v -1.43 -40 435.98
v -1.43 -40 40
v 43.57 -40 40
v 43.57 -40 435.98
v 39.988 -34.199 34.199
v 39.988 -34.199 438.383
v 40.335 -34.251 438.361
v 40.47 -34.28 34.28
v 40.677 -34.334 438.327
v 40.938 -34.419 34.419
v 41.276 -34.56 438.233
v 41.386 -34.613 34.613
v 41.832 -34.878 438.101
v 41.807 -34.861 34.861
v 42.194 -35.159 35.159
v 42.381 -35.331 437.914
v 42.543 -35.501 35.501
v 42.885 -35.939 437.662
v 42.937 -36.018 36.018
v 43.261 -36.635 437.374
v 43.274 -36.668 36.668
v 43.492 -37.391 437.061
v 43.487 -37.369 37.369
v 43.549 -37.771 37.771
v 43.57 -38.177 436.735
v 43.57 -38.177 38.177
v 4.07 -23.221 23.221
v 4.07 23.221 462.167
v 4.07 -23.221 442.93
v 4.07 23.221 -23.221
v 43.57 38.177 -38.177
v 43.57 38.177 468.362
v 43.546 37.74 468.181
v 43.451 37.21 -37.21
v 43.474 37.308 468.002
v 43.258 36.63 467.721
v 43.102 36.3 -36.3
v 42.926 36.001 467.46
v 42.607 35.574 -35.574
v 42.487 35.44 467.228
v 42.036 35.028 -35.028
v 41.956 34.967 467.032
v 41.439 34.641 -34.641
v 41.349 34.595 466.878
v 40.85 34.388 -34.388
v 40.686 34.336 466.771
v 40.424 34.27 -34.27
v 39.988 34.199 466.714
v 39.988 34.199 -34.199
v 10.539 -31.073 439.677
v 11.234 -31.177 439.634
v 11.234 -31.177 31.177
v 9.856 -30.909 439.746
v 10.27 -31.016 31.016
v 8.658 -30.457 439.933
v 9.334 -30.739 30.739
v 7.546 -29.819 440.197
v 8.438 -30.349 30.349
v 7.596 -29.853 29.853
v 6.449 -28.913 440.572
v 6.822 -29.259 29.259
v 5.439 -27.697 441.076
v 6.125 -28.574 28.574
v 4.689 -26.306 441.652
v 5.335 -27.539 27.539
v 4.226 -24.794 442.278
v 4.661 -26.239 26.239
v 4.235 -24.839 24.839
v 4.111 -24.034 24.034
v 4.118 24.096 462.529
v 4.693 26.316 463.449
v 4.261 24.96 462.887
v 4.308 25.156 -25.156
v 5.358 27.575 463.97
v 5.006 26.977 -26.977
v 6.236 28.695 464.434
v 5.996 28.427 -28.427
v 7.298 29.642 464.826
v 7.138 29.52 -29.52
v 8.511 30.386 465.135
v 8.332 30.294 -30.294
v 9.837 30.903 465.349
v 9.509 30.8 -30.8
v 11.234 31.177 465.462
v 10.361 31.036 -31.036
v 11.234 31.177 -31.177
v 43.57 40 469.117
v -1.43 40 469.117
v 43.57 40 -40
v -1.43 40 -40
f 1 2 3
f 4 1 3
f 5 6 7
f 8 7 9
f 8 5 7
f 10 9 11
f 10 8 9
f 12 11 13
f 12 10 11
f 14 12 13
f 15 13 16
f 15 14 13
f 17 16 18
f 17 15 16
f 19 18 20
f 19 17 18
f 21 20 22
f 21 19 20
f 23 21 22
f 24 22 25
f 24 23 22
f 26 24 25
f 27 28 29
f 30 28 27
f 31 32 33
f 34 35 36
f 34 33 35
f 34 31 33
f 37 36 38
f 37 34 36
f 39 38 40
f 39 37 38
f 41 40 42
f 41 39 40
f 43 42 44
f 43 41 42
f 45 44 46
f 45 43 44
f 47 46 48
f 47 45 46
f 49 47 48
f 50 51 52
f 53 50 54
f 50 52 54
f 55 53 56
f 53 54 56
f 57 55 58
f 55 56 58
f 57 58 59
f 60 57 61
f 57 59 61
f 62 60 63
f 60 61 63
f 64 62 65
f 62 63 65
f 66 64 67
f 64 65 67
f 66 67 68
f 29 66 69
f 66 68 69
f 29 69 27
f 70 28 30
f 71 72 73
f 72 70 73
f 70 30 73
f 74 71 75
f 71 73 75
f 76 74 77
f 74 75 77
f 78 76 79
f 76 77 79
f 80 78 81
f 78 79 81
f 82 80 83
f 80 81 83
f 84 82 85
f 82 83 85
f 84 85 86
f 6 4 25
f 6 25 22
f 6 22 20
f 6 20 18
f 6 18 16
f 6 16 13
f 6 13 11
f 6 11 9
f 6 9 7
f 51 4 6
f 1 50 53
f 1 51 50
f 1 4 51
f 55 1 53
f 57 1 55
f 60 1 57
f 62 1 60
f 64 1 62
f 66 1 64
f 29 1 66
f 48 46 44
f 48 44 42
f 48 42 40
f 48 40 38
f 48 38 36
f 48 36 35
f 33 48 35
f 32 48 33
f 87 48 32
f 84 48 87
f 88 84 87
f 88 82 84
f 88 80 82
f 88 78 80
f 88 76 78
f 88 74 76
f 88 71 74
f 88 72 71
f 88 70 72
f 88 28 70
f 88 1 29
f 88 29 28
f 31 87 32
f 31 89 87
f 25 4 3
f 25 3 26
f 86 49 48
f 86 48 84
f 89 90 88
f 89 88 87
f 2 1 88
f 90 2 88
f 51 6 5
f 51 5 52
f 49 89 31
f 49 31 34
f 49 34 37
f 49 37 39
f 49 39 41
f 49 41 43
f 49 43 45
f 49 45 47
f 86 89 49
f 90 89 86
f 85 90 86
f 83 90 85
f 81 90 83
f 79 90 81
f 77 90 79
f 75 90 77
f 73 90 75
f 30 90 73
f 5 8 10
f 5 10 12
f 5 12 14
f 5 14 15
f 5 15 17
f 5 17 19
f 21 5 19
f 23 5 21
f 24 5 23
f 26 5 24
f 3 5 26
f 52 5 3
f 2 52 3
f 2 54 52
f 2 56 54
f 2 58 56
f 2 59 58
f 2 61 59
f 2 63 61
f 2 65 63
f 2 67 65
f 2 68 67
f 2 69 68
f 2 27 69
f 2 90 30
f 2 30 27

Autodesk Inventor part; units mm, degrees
ref_plane "Начальная плоскость" through (0, 0, -40) normal (0, 0, 1) x (1, 0, 0)
ref_plane "Конечная плоскость" through (0, 0, 469.1169) normal (0, 0, 1) x (1, 0, 0)
sketch "Эскиз" plane through (0, 0, 0) normal (0, 0, 1) x (1, 0, 0)
  line L0 (-1.43, 0) -> (-1.43, 40)
  line L1 (-1.43, 40) -> (43.57, 40)
  line L2 (43.57, 40) -> (43.57, 38.1774)
  line L3 (39.9881, 34.1993) -> (11.2338, 31.1771)
  line L4 (4.07, 23.221) -> (4.07, 0)
  line L5 (4.07, 0) -> (-1.43, 0) construction
  line L6 (23.82, 40) -> (23.82, 32.5) construction
  line L7 (43.57, 34.5758) -> (43.57, 32.5) construction
  line L8 (43.57, 32.5) -> (23.82, 32.5) construction
  line L9 (0, 15) -> (0, -27) construction
  line L10 (-5.539, 0) -> (16.0067, 0) construction
  line L11 (-1.43, 0) -> (-1.43, -40)
  line L12 (-1.43, -40) -> (43.57, -40)
  line L13 (43.57, -40) -> (43.57, -38.1774)
  line L14 (39.9881, -34.1993) -> (11.2338, -31.1771)
  line L15 (4.07, -23.221) -> (4.07, 0)
  arc A0 (11.2338, 31.1771) -> (4.07, 23.221) centre (12.07, 23.221) ccw
  arc A1 (4.07, -23.221) -> (11.2338, -31.1771) centre (12.07, -23.221) ccw
  arc A2 (39.9881, 34.1993) -> (43.57, 38.1774) centre (39.57, 38.1774) ccw
  arc A3 (43.57, -38.1774) -> (39.9881, -34.1993) centre (39.57, -38.1774) ccw
  line L16 (0, 56) -> (0, -56) construction
  line L17 (-15.5135, 0) -> (54.308, 0) construction
  point P0 (4.07, 30.4242)
  point P1 (43.57, -34.5758)
  point P2 (4.07, -30.4242)
  point P3 (23.82, -40)
  point P4 (23.82, -32.5)
  dimension "d0" = 5.5
  dimension "d1" = 40
  dimension "d2" = 45
  dimension "d3" = 7.5
  dimension "d4" = 19.75
  dimension "d5" = 2.0758
  dimension "d23" = 8
  dimension "d24" = 4
  dimension "d25" = 1.43
extrude "Тело" add sketch "Эскиз" along normal up to surface (509.1169 mm away) from surface at -40
sketch "Sketch3" plane through (0, 0, 0) normal (0, 0, 1) x (1, 0, 0)
  line L0 (0, 0) -> (10, 0)
ref_plane "Work Plane3" through (0, 0, 0) normal (0, -1, 0) x (1, 0, 0)
sketch "Sketch4" plane through (0, 0, 0) normal (0, -1, 0) x (1, 0, 0)
  line L0 (-2, -40) -> (12, -40)
  line L1 (-2, 469.1169) -> (12, 469.1169)
  dimension "d29" = 509.1169
ref_plane "РабПлоскость4" through (21.07, 40, 469.1169) normal (0, -0.3827, 0.9239) x (1, 0, 0)
split "Разделение1" plane through (21.07, 40, 469.1169) removes the side toward (0, -0.3827, 0.9239)
ref_plane "РабПлоскость8" through (753.131, -459.0658, 459.0658) normal (0, -0.7071, -0.7071) x (1, 0, 0)
split "Разделение2" plane through (753.131, -459.0658, 459.0658) removes the side toward (0, -0.7071, -0.7071)
equation "\"d0\" = G_T"
equation "\"d1\" = 0.5 * G_H"
equation "\"d2\" = G_W"
equation "\"d3\" = G_T1"
equation "\"d4\" = G_C"
equation "\"d23\" = G_IR"
equation "\"d24\" = G_ER"
equation "\"d25\" = ex"
equation "\"d6\" = G_L"
equation "\"G_W\" = 45"
equation "\"G_T\" = 5.5"
equation "\"G_T1\" = 7.5"
equation "\"G_NG\" = 0.105104"
equation "\"G_ER\" = 4"
equation "\"G_IR\" = 8"
equation "\"G_C\" = 19.75"
equation "\"G_L\" = d29"
equation "\"ex\" = 1.43"
equation "\"G_OFFSET_END\" = 16.56854"
equation "\"d27\" = G_OFFSET_END + B_L"
equation "\"B_L\" = 452.54834"
equation "\"G_H\" = 80"
properties part number "ISO 657/11 - CH 80 x 8 - 509,12" material "Сталь, мягкая"
